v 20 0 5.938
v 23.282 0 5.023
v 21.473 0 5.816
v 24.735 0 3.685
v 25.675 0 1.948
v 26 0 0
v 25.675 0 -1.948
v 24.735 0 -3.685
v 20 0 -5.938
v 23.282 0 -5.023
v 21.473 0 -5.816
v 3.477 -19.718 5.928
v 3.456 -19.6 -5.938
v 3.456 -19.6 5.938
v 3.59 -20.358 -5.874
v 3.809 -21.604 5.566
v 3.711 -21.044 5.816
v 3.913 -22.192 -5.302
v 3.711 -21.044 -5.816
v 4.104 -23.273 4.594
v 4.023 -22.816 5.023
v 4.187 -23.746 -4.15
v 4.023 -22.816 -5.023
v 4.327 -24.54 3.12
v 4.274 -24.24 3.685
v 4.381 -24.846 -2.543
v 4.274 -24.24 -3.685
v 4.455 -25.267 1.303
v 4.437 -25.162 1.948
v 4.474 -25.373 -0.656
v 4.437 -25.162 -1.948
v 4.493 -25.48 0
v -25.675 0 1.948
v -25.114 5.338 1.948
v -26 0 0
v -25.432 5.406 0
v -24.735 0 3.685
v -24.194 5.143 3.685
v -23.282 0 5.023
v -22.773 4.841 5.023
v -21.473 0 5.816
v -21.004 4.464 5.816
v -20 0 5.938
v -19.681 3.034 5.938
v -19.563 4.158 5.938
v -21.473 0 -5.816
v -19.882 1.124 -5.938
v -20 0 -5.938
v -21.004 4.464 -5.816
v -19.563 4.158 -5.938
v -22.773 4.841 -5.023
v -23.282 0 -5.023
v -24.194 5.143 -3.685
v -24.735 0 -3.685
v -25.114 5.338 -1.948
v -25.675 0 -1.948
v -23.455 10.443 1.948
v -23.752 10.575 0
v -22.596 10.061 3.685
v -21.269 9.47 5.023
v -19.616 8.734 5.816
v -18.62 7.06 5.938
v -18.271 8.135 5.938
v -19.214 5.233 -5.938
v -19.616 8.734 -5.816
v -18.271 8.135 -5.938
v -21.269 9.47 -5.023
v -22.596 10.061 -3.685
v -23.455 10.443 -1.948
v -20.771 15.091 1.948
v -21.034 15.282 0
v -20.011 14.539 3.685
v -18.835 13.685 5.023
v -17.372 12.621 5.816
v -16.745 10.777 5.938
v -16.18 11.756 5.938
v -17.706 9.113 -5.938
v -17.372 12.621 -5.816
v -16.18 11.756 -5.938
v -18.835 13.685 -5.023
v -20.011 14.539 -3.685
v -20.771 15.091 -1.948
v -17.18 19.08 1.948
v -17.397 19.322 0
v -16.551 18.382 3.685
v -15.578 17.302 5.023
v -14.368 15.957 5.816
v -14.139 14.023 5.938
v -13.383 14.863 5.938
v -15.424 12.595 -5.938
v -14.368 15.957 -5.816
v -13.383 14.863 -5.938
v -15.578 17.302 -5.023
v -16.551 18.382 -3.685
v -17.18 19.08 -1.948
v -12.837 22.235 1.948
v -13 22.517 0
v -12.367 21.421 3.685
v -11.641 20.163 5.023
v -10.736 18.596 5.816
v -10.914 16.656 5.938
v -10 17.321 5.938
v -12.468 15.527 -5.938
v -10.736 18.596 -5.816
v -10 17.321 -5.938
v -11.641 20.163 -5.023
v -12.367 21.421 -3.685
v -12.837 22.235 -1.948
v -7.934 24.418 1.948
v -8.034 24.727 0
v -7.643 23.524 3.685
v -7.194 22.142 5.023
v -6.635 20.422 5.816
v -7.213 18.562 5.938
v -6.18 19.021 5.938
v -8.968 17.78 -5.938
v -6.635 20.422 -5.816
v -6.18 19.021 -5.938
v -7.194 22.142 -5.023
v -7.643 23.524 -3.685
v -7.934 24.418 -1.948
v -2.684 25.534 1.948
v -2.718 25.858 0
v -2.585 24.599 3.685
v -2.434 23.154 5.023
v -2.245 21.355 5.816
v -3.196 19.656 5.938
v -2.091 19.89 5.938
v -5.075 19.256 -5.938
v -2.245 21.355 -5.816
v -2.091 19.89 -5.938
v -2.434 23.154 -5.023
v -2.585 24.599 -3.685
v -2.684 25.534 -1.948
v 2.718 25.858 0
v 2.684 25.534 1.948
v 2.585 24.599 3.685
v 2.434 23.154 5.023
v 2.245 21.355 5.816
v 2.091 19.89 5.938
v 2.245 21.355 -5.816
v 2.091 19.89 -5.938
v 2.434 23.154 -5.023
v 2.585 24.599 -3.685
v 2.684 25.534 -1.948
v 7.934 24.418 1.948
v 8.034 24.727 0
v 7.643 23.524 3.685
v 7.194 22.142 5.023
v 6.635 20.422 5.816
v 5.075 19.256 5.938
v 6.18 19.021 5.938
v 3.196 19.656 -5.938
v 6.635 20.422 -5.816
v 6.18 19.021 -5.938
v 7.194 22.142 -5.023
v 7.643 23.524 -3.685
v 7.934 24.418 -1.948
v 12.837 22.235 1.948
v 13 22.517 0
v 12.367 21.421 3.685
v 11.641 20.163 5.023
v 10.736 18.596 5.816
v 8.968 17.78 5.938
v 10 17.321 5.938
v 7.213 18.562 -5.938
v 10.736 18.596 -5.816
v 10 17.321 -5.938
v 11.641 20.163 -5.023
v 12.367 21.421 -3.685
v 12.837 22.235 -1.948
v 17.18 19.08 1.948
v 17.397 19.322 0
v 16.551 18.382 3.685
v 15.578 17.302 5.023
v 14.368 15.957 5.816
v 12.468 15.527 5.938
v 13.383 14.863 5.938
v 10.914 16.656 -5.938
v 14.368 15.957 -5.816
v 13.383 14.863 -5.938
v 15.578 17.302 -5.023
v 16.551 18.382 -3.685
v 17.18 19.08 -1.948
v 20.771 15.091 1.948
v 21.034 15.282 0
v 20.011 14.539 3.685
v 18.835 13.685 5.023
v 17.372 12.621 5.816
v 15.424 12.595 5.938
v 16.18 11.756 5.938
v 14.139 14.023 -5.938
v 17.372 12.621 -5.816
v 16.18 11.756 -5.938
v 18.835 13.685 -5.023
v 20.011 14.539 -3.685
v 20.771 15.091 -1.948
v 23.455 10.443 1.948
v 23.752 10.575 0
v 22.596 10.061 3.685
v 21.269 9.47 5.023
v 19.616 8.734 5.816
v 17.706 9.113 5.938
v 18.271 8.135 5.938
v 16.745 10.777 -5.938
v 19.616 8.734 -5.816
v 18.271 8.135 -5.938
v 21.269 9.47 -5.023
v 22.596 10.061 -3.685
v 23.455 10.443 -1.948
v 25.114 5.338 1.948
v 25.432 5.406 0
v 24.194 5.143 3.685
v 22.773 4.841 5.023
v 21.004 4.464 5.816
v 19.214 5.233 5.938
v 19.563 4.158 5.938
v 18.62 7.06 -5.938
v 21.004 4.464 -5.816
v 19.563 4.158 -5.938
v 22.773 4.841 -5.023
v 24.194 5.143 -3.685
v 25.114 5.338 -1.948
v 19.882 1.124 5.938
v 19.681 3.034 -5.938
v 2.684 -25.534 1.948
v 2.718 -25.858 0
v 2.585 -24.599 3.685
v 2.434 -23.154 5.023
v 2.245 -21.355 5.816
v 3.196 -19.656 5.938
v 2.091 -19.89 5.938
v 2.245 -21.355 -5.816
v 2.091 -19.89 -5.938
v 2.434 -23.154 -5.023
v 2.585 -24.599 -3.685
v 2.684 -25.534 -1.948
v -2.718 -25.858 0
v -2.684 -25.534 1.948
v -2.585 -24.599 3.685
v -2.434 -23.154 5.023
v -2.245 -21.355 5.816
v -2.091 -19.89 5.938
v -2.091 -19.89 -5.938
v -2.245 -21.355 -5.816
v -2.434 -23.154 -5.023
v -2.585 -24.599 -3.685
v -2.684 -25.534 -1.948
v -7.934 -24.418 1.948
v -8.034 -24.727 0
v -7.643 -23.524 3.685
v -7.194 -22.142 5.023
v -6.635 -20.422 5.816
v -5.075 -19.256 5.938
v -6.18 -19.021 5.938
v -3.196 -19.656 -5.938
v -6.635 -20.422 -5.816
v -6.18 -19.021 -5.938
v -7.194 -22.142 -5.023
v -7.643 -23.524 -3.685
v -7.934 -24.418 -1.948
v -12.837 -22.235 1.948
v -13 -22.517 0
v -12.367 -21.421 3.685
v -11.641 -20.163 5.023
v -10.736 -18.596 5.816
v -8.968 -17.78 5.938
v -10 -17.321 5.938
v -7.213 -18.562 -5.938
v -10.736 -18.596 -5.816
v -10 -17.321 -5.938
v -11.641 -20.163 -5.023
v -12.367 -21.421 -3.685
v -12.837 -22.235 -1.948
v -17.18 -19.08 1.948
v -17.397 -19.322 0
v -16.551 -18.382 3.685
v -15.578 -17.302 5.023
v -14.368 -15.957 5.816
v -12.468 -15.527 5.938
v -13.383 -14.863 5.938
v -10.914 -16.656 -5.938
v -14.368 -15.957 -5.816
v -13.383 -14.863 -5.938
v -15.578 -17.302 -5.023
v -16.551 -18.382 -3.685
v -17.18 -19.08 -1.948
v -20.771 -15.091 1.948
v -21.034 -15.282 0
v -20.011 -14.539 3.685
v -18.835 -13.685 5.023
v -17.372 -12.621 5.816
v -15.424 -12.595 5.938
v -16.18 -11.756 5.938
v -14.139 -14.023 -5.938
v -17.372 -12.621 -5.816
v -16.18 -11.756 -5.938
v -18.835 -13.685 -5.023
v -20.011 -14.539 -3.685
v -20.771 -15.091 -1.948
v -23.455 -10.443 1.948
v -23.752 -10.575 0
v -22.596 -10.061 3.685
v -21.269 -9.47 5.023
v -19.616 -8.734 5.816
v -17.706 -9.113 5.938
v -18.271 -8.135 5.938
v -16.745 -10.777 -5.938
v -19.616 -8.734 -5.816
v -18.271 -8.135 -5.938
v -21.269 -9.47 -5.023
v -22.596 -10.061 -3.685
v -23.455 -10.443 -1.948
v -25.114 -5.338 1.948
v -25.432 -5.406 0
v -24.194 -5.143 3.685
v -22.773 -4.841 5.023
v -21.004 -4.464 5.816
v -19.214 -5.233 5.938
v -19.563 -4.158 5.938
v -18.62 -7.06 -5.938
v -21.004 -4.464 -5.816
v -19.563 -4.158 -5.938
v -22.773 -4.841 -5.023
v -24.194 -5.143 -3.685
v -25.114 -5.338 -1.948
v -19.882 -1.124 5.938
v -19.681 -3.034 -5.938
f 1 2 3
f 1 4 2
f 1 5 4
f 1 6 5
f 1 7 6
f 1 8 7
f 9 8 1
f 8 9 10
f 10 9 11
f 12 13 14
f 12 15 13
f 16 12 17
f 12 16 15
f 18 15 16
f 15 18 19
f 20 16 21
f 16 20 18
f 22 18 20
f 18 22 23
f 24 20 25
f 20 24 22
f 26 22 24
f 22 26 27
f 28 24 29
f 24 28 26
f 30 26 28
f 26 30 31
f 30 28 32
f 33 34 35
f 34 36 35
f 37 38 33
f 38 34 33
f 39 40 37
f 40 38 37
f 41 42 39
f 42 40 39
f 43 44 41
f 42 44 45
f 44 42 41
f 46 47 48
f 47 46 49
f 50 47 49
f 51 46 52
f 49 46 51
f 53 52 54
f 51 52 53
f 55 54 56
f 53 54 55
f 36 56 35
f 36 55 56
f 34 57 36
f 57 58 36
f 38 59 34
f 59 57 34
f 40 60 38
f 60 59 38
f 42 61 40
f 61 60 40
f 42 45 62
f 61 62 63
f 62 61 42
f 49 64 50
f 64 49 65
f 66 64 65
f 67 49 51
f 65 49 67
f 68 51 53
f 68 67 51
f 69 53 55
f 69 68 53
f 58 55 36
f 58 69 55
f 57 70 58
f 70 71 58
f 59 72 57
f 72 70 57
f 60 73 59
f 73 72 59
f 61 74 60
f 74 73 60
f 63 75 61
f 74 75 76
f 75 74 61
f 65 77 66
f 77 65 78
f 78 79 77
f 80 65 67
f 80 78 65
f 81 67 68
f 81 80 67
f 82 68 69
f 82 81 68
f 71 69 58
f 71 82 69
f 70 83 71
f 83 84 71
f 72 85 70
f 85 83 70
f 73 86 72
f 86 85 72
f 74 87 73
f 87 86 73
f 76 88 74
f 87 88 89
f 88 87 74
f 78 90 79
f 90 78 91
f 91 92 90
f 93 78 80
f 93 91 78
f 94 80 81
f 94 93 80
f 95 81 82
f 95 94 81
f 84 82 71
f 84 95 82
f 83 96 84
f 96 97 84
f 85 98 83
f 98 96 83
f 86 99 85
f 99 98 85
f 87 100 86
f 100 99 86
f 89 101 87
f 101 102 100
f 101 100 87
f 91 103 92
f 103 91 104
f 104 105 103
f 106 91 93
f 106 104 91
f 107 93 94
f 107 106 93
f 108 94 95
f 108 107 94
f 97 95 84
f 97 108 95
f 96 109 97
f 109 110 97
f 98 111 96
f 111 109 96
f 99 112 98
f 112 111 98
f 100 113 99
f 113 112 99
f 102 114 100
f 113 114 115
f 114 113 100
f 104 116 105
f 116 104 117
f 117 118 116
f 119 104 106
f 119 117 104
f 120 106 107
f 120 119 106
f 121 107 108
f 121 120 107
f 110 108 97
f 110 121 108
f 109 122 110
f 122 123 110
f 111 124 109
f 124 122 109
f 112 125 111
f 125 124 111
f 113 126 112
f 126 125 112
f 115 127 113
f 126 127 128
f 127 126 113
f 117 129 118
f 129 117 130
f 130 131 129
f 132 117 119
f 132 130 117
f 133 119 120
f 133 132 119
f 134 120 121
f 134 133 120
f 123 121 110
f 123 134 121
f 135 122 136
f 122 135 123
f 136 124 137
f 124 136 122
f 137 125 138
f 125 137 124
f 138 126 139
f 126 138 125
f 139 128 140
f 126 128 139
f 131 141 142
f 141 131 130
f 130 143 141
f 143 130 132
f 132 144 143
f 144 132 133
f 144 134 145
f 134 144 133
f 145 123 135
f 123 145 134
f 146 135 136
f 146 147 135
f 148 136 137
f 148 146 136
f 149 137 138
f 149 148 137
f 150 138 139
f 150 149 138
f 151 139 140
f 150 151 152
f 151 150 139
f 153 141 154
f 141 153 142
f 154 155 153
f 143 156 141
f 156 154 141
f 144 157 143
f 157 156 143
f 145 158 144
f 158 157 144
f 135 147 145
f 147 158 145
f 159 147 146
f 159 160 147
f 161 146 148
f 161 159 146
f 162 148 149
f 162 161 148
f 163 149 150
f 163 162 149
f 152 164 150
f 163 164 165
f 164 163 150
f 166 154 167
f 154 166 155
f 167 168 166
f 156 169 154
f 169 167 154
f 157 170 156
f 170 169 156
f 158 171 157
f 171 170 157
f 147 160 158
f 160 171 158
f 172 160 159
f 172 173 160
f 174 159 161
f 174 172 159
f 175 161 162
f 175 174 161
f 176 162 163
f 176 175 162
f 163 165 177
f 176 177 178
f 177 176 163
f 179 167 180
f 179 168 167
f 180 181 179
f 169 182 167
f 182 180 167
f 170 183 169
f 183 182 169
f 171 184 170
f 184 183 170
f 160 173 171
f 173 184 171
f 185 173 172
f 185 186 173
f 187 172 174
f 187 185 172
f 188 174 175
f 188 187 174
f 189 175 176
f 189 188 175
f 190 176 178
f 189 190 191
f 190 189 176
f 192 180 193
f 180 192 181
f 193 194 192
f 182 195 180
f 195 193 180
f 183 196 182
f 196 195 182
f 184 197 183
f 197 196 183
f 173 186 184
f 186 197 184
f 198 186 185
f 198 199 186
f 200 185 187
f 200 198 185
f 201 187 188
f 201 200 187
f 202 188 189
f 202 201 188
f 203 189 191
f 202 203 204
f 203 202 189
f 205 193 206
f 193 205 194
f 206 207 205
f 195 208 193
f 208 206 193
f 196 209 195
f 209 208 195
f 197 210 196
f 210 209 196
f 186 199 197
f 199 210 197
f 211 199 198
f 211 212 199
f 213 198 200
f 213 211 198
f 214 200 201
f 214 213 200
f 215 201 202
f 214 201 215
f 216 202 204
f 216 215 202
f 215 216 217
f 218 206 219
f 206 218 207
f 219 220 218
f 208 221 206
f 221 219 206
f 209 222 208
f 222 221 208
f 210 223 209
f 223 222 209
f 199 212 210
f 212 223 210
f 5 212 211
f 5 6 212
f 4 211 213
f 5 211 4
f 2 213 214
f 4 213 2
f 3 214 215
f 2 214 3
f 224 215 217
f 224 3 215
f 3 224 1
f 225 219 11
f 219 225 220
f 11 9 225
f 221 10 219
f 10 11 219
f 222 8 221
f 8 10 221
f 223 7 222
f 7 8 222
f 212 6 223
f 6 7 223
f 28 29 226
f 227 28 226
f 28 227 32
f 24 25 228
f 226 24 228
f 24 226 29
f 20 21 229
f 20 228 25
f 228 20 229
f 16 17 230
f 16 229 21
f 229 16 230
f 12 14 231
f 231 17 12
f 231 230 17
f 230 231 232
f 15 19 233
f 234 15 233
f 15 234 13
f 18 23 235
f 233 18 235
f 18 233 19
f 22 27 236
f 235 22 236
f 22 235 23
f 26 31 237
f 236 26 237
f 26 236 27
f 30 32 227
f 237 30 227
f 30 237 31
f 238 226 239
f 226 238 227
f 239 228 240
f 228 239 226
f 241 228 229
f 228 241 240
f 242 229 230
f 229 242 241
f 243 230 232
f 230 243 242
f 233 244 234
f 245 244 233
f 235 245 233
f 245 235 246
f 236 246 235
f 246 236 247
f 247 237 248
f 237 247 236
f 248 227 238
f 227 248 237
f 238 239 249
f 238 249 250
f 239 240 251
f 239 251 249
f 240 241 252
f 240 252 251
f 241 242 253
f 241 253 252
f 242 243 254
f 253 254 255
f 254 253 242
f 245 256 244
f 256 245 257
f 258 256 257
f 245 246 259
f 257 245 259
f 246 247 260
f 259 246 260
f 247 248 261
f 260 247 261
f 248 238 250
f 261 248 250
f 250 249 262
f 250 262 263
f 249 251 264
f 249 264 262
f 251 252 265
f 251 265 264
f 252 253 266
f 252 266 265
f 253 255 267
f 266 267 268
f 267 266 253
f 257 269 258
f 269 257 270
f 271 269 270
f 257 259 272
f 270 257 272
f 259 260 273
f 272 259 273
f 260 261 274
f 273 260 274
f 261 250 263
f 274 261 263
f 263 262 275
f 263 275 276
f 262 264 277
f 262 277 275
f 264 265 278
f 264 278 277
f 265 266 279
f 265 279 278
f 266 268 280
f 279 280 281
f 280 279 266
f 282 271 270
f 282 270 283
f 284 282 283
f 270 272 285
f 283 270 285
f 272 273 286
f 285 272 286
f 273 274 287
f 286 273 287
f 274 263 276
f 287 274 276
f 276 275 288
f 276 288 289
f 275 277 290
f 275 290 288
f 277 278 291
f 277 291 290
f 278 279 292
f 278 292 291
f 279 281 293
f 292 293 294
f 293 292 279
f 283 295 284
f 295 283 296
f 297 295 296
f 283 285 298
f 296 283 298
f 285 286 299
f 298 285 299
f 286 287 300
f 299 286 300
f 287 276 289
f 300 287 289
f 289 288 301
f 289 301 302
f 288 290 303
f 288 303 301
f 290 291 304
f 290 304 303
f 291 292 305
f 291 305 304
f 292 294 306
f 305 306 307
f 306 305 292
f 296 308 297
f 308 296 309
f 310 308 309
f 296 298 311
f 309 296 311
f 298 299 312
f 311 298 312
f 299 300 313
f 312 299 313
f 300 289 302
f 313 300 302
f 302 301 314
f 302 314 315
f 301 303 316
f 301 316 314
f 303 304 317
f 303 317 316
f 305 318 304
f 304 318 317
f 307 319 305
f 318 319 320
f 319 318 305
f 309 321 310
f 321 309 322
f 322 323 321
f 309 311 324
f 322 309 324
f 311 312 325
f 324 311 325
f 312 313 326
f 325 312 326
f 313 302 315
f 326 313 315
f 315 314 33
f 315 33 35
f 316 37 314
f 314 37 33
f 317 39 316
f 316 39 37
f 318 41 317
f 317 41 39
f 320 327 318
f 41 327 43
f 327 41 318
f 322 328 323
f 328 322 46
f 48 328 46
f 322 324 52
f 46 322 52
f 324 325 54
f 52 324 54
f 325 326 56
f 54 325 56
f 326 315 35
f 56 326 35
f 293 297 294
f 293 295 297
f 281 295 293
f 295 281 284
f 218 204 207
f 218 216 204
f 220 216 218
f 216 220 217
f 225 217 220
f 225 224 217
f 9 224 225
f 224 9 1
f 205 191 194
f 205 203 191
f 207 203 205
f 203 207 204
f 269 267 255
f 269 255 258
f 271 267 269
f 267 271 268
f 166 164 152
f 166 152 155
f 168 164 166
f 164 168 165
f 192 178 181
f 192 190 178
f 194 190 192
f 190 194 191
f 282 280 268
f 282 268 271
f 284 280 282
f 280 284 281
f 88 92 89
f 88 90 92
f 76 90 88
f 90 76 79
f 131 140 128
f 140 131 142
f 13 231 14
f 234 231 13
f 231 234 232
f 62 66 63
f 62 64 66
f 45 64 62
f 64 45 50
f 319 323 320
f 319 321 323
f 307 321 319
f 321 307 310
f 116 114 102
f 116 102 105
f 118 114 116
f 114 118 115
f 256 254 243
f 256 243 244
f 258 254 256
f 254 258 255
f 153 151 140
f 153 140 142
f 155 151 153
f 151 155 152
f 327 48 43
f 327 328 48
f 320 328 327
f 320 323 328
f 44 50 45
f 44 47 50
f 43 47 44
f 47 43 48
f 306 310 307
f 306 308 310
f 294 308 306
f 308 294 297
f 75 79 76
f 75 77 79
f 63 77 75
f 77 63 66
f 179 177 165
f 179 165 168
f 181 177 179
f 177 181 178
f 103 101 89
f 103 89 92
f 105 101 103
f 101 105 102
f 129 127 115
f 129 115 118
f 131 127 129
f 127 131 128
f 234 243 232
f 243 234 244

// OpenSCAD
// Author: Samuel El-Borai <samuel.elborai@gmail.com>
// Date: 04/04/2014
//
// A very basic ring

ring();

module ring() {
    difference() {
        partial_rotate_extrude(280, 20, 10)
        circle(6);
        cylinder(100, 20, 20, true);
    };
}

module pie_slice(radius, angle, step) {
	for(theta = [0:step:angle-step]) {
		rotate([0,0,0])
		linear_extrude(height = radius*2, center=true)
		polygon(
			points = [
				[0,0],
				[radius * cos(theta+step) ,radius * sin(theta+step)],
				[radius*cos(theta),radius*sin(theta)]
			]
		);
	}
}

module partial_rotate_extrude(angle, radius, convex) {
	intersection () {
		rotate_extrude(convexity=convex) translate([radius,0,0]) child(0);
		pie_slice(radius*2, angle, angle/30);
	}
}
